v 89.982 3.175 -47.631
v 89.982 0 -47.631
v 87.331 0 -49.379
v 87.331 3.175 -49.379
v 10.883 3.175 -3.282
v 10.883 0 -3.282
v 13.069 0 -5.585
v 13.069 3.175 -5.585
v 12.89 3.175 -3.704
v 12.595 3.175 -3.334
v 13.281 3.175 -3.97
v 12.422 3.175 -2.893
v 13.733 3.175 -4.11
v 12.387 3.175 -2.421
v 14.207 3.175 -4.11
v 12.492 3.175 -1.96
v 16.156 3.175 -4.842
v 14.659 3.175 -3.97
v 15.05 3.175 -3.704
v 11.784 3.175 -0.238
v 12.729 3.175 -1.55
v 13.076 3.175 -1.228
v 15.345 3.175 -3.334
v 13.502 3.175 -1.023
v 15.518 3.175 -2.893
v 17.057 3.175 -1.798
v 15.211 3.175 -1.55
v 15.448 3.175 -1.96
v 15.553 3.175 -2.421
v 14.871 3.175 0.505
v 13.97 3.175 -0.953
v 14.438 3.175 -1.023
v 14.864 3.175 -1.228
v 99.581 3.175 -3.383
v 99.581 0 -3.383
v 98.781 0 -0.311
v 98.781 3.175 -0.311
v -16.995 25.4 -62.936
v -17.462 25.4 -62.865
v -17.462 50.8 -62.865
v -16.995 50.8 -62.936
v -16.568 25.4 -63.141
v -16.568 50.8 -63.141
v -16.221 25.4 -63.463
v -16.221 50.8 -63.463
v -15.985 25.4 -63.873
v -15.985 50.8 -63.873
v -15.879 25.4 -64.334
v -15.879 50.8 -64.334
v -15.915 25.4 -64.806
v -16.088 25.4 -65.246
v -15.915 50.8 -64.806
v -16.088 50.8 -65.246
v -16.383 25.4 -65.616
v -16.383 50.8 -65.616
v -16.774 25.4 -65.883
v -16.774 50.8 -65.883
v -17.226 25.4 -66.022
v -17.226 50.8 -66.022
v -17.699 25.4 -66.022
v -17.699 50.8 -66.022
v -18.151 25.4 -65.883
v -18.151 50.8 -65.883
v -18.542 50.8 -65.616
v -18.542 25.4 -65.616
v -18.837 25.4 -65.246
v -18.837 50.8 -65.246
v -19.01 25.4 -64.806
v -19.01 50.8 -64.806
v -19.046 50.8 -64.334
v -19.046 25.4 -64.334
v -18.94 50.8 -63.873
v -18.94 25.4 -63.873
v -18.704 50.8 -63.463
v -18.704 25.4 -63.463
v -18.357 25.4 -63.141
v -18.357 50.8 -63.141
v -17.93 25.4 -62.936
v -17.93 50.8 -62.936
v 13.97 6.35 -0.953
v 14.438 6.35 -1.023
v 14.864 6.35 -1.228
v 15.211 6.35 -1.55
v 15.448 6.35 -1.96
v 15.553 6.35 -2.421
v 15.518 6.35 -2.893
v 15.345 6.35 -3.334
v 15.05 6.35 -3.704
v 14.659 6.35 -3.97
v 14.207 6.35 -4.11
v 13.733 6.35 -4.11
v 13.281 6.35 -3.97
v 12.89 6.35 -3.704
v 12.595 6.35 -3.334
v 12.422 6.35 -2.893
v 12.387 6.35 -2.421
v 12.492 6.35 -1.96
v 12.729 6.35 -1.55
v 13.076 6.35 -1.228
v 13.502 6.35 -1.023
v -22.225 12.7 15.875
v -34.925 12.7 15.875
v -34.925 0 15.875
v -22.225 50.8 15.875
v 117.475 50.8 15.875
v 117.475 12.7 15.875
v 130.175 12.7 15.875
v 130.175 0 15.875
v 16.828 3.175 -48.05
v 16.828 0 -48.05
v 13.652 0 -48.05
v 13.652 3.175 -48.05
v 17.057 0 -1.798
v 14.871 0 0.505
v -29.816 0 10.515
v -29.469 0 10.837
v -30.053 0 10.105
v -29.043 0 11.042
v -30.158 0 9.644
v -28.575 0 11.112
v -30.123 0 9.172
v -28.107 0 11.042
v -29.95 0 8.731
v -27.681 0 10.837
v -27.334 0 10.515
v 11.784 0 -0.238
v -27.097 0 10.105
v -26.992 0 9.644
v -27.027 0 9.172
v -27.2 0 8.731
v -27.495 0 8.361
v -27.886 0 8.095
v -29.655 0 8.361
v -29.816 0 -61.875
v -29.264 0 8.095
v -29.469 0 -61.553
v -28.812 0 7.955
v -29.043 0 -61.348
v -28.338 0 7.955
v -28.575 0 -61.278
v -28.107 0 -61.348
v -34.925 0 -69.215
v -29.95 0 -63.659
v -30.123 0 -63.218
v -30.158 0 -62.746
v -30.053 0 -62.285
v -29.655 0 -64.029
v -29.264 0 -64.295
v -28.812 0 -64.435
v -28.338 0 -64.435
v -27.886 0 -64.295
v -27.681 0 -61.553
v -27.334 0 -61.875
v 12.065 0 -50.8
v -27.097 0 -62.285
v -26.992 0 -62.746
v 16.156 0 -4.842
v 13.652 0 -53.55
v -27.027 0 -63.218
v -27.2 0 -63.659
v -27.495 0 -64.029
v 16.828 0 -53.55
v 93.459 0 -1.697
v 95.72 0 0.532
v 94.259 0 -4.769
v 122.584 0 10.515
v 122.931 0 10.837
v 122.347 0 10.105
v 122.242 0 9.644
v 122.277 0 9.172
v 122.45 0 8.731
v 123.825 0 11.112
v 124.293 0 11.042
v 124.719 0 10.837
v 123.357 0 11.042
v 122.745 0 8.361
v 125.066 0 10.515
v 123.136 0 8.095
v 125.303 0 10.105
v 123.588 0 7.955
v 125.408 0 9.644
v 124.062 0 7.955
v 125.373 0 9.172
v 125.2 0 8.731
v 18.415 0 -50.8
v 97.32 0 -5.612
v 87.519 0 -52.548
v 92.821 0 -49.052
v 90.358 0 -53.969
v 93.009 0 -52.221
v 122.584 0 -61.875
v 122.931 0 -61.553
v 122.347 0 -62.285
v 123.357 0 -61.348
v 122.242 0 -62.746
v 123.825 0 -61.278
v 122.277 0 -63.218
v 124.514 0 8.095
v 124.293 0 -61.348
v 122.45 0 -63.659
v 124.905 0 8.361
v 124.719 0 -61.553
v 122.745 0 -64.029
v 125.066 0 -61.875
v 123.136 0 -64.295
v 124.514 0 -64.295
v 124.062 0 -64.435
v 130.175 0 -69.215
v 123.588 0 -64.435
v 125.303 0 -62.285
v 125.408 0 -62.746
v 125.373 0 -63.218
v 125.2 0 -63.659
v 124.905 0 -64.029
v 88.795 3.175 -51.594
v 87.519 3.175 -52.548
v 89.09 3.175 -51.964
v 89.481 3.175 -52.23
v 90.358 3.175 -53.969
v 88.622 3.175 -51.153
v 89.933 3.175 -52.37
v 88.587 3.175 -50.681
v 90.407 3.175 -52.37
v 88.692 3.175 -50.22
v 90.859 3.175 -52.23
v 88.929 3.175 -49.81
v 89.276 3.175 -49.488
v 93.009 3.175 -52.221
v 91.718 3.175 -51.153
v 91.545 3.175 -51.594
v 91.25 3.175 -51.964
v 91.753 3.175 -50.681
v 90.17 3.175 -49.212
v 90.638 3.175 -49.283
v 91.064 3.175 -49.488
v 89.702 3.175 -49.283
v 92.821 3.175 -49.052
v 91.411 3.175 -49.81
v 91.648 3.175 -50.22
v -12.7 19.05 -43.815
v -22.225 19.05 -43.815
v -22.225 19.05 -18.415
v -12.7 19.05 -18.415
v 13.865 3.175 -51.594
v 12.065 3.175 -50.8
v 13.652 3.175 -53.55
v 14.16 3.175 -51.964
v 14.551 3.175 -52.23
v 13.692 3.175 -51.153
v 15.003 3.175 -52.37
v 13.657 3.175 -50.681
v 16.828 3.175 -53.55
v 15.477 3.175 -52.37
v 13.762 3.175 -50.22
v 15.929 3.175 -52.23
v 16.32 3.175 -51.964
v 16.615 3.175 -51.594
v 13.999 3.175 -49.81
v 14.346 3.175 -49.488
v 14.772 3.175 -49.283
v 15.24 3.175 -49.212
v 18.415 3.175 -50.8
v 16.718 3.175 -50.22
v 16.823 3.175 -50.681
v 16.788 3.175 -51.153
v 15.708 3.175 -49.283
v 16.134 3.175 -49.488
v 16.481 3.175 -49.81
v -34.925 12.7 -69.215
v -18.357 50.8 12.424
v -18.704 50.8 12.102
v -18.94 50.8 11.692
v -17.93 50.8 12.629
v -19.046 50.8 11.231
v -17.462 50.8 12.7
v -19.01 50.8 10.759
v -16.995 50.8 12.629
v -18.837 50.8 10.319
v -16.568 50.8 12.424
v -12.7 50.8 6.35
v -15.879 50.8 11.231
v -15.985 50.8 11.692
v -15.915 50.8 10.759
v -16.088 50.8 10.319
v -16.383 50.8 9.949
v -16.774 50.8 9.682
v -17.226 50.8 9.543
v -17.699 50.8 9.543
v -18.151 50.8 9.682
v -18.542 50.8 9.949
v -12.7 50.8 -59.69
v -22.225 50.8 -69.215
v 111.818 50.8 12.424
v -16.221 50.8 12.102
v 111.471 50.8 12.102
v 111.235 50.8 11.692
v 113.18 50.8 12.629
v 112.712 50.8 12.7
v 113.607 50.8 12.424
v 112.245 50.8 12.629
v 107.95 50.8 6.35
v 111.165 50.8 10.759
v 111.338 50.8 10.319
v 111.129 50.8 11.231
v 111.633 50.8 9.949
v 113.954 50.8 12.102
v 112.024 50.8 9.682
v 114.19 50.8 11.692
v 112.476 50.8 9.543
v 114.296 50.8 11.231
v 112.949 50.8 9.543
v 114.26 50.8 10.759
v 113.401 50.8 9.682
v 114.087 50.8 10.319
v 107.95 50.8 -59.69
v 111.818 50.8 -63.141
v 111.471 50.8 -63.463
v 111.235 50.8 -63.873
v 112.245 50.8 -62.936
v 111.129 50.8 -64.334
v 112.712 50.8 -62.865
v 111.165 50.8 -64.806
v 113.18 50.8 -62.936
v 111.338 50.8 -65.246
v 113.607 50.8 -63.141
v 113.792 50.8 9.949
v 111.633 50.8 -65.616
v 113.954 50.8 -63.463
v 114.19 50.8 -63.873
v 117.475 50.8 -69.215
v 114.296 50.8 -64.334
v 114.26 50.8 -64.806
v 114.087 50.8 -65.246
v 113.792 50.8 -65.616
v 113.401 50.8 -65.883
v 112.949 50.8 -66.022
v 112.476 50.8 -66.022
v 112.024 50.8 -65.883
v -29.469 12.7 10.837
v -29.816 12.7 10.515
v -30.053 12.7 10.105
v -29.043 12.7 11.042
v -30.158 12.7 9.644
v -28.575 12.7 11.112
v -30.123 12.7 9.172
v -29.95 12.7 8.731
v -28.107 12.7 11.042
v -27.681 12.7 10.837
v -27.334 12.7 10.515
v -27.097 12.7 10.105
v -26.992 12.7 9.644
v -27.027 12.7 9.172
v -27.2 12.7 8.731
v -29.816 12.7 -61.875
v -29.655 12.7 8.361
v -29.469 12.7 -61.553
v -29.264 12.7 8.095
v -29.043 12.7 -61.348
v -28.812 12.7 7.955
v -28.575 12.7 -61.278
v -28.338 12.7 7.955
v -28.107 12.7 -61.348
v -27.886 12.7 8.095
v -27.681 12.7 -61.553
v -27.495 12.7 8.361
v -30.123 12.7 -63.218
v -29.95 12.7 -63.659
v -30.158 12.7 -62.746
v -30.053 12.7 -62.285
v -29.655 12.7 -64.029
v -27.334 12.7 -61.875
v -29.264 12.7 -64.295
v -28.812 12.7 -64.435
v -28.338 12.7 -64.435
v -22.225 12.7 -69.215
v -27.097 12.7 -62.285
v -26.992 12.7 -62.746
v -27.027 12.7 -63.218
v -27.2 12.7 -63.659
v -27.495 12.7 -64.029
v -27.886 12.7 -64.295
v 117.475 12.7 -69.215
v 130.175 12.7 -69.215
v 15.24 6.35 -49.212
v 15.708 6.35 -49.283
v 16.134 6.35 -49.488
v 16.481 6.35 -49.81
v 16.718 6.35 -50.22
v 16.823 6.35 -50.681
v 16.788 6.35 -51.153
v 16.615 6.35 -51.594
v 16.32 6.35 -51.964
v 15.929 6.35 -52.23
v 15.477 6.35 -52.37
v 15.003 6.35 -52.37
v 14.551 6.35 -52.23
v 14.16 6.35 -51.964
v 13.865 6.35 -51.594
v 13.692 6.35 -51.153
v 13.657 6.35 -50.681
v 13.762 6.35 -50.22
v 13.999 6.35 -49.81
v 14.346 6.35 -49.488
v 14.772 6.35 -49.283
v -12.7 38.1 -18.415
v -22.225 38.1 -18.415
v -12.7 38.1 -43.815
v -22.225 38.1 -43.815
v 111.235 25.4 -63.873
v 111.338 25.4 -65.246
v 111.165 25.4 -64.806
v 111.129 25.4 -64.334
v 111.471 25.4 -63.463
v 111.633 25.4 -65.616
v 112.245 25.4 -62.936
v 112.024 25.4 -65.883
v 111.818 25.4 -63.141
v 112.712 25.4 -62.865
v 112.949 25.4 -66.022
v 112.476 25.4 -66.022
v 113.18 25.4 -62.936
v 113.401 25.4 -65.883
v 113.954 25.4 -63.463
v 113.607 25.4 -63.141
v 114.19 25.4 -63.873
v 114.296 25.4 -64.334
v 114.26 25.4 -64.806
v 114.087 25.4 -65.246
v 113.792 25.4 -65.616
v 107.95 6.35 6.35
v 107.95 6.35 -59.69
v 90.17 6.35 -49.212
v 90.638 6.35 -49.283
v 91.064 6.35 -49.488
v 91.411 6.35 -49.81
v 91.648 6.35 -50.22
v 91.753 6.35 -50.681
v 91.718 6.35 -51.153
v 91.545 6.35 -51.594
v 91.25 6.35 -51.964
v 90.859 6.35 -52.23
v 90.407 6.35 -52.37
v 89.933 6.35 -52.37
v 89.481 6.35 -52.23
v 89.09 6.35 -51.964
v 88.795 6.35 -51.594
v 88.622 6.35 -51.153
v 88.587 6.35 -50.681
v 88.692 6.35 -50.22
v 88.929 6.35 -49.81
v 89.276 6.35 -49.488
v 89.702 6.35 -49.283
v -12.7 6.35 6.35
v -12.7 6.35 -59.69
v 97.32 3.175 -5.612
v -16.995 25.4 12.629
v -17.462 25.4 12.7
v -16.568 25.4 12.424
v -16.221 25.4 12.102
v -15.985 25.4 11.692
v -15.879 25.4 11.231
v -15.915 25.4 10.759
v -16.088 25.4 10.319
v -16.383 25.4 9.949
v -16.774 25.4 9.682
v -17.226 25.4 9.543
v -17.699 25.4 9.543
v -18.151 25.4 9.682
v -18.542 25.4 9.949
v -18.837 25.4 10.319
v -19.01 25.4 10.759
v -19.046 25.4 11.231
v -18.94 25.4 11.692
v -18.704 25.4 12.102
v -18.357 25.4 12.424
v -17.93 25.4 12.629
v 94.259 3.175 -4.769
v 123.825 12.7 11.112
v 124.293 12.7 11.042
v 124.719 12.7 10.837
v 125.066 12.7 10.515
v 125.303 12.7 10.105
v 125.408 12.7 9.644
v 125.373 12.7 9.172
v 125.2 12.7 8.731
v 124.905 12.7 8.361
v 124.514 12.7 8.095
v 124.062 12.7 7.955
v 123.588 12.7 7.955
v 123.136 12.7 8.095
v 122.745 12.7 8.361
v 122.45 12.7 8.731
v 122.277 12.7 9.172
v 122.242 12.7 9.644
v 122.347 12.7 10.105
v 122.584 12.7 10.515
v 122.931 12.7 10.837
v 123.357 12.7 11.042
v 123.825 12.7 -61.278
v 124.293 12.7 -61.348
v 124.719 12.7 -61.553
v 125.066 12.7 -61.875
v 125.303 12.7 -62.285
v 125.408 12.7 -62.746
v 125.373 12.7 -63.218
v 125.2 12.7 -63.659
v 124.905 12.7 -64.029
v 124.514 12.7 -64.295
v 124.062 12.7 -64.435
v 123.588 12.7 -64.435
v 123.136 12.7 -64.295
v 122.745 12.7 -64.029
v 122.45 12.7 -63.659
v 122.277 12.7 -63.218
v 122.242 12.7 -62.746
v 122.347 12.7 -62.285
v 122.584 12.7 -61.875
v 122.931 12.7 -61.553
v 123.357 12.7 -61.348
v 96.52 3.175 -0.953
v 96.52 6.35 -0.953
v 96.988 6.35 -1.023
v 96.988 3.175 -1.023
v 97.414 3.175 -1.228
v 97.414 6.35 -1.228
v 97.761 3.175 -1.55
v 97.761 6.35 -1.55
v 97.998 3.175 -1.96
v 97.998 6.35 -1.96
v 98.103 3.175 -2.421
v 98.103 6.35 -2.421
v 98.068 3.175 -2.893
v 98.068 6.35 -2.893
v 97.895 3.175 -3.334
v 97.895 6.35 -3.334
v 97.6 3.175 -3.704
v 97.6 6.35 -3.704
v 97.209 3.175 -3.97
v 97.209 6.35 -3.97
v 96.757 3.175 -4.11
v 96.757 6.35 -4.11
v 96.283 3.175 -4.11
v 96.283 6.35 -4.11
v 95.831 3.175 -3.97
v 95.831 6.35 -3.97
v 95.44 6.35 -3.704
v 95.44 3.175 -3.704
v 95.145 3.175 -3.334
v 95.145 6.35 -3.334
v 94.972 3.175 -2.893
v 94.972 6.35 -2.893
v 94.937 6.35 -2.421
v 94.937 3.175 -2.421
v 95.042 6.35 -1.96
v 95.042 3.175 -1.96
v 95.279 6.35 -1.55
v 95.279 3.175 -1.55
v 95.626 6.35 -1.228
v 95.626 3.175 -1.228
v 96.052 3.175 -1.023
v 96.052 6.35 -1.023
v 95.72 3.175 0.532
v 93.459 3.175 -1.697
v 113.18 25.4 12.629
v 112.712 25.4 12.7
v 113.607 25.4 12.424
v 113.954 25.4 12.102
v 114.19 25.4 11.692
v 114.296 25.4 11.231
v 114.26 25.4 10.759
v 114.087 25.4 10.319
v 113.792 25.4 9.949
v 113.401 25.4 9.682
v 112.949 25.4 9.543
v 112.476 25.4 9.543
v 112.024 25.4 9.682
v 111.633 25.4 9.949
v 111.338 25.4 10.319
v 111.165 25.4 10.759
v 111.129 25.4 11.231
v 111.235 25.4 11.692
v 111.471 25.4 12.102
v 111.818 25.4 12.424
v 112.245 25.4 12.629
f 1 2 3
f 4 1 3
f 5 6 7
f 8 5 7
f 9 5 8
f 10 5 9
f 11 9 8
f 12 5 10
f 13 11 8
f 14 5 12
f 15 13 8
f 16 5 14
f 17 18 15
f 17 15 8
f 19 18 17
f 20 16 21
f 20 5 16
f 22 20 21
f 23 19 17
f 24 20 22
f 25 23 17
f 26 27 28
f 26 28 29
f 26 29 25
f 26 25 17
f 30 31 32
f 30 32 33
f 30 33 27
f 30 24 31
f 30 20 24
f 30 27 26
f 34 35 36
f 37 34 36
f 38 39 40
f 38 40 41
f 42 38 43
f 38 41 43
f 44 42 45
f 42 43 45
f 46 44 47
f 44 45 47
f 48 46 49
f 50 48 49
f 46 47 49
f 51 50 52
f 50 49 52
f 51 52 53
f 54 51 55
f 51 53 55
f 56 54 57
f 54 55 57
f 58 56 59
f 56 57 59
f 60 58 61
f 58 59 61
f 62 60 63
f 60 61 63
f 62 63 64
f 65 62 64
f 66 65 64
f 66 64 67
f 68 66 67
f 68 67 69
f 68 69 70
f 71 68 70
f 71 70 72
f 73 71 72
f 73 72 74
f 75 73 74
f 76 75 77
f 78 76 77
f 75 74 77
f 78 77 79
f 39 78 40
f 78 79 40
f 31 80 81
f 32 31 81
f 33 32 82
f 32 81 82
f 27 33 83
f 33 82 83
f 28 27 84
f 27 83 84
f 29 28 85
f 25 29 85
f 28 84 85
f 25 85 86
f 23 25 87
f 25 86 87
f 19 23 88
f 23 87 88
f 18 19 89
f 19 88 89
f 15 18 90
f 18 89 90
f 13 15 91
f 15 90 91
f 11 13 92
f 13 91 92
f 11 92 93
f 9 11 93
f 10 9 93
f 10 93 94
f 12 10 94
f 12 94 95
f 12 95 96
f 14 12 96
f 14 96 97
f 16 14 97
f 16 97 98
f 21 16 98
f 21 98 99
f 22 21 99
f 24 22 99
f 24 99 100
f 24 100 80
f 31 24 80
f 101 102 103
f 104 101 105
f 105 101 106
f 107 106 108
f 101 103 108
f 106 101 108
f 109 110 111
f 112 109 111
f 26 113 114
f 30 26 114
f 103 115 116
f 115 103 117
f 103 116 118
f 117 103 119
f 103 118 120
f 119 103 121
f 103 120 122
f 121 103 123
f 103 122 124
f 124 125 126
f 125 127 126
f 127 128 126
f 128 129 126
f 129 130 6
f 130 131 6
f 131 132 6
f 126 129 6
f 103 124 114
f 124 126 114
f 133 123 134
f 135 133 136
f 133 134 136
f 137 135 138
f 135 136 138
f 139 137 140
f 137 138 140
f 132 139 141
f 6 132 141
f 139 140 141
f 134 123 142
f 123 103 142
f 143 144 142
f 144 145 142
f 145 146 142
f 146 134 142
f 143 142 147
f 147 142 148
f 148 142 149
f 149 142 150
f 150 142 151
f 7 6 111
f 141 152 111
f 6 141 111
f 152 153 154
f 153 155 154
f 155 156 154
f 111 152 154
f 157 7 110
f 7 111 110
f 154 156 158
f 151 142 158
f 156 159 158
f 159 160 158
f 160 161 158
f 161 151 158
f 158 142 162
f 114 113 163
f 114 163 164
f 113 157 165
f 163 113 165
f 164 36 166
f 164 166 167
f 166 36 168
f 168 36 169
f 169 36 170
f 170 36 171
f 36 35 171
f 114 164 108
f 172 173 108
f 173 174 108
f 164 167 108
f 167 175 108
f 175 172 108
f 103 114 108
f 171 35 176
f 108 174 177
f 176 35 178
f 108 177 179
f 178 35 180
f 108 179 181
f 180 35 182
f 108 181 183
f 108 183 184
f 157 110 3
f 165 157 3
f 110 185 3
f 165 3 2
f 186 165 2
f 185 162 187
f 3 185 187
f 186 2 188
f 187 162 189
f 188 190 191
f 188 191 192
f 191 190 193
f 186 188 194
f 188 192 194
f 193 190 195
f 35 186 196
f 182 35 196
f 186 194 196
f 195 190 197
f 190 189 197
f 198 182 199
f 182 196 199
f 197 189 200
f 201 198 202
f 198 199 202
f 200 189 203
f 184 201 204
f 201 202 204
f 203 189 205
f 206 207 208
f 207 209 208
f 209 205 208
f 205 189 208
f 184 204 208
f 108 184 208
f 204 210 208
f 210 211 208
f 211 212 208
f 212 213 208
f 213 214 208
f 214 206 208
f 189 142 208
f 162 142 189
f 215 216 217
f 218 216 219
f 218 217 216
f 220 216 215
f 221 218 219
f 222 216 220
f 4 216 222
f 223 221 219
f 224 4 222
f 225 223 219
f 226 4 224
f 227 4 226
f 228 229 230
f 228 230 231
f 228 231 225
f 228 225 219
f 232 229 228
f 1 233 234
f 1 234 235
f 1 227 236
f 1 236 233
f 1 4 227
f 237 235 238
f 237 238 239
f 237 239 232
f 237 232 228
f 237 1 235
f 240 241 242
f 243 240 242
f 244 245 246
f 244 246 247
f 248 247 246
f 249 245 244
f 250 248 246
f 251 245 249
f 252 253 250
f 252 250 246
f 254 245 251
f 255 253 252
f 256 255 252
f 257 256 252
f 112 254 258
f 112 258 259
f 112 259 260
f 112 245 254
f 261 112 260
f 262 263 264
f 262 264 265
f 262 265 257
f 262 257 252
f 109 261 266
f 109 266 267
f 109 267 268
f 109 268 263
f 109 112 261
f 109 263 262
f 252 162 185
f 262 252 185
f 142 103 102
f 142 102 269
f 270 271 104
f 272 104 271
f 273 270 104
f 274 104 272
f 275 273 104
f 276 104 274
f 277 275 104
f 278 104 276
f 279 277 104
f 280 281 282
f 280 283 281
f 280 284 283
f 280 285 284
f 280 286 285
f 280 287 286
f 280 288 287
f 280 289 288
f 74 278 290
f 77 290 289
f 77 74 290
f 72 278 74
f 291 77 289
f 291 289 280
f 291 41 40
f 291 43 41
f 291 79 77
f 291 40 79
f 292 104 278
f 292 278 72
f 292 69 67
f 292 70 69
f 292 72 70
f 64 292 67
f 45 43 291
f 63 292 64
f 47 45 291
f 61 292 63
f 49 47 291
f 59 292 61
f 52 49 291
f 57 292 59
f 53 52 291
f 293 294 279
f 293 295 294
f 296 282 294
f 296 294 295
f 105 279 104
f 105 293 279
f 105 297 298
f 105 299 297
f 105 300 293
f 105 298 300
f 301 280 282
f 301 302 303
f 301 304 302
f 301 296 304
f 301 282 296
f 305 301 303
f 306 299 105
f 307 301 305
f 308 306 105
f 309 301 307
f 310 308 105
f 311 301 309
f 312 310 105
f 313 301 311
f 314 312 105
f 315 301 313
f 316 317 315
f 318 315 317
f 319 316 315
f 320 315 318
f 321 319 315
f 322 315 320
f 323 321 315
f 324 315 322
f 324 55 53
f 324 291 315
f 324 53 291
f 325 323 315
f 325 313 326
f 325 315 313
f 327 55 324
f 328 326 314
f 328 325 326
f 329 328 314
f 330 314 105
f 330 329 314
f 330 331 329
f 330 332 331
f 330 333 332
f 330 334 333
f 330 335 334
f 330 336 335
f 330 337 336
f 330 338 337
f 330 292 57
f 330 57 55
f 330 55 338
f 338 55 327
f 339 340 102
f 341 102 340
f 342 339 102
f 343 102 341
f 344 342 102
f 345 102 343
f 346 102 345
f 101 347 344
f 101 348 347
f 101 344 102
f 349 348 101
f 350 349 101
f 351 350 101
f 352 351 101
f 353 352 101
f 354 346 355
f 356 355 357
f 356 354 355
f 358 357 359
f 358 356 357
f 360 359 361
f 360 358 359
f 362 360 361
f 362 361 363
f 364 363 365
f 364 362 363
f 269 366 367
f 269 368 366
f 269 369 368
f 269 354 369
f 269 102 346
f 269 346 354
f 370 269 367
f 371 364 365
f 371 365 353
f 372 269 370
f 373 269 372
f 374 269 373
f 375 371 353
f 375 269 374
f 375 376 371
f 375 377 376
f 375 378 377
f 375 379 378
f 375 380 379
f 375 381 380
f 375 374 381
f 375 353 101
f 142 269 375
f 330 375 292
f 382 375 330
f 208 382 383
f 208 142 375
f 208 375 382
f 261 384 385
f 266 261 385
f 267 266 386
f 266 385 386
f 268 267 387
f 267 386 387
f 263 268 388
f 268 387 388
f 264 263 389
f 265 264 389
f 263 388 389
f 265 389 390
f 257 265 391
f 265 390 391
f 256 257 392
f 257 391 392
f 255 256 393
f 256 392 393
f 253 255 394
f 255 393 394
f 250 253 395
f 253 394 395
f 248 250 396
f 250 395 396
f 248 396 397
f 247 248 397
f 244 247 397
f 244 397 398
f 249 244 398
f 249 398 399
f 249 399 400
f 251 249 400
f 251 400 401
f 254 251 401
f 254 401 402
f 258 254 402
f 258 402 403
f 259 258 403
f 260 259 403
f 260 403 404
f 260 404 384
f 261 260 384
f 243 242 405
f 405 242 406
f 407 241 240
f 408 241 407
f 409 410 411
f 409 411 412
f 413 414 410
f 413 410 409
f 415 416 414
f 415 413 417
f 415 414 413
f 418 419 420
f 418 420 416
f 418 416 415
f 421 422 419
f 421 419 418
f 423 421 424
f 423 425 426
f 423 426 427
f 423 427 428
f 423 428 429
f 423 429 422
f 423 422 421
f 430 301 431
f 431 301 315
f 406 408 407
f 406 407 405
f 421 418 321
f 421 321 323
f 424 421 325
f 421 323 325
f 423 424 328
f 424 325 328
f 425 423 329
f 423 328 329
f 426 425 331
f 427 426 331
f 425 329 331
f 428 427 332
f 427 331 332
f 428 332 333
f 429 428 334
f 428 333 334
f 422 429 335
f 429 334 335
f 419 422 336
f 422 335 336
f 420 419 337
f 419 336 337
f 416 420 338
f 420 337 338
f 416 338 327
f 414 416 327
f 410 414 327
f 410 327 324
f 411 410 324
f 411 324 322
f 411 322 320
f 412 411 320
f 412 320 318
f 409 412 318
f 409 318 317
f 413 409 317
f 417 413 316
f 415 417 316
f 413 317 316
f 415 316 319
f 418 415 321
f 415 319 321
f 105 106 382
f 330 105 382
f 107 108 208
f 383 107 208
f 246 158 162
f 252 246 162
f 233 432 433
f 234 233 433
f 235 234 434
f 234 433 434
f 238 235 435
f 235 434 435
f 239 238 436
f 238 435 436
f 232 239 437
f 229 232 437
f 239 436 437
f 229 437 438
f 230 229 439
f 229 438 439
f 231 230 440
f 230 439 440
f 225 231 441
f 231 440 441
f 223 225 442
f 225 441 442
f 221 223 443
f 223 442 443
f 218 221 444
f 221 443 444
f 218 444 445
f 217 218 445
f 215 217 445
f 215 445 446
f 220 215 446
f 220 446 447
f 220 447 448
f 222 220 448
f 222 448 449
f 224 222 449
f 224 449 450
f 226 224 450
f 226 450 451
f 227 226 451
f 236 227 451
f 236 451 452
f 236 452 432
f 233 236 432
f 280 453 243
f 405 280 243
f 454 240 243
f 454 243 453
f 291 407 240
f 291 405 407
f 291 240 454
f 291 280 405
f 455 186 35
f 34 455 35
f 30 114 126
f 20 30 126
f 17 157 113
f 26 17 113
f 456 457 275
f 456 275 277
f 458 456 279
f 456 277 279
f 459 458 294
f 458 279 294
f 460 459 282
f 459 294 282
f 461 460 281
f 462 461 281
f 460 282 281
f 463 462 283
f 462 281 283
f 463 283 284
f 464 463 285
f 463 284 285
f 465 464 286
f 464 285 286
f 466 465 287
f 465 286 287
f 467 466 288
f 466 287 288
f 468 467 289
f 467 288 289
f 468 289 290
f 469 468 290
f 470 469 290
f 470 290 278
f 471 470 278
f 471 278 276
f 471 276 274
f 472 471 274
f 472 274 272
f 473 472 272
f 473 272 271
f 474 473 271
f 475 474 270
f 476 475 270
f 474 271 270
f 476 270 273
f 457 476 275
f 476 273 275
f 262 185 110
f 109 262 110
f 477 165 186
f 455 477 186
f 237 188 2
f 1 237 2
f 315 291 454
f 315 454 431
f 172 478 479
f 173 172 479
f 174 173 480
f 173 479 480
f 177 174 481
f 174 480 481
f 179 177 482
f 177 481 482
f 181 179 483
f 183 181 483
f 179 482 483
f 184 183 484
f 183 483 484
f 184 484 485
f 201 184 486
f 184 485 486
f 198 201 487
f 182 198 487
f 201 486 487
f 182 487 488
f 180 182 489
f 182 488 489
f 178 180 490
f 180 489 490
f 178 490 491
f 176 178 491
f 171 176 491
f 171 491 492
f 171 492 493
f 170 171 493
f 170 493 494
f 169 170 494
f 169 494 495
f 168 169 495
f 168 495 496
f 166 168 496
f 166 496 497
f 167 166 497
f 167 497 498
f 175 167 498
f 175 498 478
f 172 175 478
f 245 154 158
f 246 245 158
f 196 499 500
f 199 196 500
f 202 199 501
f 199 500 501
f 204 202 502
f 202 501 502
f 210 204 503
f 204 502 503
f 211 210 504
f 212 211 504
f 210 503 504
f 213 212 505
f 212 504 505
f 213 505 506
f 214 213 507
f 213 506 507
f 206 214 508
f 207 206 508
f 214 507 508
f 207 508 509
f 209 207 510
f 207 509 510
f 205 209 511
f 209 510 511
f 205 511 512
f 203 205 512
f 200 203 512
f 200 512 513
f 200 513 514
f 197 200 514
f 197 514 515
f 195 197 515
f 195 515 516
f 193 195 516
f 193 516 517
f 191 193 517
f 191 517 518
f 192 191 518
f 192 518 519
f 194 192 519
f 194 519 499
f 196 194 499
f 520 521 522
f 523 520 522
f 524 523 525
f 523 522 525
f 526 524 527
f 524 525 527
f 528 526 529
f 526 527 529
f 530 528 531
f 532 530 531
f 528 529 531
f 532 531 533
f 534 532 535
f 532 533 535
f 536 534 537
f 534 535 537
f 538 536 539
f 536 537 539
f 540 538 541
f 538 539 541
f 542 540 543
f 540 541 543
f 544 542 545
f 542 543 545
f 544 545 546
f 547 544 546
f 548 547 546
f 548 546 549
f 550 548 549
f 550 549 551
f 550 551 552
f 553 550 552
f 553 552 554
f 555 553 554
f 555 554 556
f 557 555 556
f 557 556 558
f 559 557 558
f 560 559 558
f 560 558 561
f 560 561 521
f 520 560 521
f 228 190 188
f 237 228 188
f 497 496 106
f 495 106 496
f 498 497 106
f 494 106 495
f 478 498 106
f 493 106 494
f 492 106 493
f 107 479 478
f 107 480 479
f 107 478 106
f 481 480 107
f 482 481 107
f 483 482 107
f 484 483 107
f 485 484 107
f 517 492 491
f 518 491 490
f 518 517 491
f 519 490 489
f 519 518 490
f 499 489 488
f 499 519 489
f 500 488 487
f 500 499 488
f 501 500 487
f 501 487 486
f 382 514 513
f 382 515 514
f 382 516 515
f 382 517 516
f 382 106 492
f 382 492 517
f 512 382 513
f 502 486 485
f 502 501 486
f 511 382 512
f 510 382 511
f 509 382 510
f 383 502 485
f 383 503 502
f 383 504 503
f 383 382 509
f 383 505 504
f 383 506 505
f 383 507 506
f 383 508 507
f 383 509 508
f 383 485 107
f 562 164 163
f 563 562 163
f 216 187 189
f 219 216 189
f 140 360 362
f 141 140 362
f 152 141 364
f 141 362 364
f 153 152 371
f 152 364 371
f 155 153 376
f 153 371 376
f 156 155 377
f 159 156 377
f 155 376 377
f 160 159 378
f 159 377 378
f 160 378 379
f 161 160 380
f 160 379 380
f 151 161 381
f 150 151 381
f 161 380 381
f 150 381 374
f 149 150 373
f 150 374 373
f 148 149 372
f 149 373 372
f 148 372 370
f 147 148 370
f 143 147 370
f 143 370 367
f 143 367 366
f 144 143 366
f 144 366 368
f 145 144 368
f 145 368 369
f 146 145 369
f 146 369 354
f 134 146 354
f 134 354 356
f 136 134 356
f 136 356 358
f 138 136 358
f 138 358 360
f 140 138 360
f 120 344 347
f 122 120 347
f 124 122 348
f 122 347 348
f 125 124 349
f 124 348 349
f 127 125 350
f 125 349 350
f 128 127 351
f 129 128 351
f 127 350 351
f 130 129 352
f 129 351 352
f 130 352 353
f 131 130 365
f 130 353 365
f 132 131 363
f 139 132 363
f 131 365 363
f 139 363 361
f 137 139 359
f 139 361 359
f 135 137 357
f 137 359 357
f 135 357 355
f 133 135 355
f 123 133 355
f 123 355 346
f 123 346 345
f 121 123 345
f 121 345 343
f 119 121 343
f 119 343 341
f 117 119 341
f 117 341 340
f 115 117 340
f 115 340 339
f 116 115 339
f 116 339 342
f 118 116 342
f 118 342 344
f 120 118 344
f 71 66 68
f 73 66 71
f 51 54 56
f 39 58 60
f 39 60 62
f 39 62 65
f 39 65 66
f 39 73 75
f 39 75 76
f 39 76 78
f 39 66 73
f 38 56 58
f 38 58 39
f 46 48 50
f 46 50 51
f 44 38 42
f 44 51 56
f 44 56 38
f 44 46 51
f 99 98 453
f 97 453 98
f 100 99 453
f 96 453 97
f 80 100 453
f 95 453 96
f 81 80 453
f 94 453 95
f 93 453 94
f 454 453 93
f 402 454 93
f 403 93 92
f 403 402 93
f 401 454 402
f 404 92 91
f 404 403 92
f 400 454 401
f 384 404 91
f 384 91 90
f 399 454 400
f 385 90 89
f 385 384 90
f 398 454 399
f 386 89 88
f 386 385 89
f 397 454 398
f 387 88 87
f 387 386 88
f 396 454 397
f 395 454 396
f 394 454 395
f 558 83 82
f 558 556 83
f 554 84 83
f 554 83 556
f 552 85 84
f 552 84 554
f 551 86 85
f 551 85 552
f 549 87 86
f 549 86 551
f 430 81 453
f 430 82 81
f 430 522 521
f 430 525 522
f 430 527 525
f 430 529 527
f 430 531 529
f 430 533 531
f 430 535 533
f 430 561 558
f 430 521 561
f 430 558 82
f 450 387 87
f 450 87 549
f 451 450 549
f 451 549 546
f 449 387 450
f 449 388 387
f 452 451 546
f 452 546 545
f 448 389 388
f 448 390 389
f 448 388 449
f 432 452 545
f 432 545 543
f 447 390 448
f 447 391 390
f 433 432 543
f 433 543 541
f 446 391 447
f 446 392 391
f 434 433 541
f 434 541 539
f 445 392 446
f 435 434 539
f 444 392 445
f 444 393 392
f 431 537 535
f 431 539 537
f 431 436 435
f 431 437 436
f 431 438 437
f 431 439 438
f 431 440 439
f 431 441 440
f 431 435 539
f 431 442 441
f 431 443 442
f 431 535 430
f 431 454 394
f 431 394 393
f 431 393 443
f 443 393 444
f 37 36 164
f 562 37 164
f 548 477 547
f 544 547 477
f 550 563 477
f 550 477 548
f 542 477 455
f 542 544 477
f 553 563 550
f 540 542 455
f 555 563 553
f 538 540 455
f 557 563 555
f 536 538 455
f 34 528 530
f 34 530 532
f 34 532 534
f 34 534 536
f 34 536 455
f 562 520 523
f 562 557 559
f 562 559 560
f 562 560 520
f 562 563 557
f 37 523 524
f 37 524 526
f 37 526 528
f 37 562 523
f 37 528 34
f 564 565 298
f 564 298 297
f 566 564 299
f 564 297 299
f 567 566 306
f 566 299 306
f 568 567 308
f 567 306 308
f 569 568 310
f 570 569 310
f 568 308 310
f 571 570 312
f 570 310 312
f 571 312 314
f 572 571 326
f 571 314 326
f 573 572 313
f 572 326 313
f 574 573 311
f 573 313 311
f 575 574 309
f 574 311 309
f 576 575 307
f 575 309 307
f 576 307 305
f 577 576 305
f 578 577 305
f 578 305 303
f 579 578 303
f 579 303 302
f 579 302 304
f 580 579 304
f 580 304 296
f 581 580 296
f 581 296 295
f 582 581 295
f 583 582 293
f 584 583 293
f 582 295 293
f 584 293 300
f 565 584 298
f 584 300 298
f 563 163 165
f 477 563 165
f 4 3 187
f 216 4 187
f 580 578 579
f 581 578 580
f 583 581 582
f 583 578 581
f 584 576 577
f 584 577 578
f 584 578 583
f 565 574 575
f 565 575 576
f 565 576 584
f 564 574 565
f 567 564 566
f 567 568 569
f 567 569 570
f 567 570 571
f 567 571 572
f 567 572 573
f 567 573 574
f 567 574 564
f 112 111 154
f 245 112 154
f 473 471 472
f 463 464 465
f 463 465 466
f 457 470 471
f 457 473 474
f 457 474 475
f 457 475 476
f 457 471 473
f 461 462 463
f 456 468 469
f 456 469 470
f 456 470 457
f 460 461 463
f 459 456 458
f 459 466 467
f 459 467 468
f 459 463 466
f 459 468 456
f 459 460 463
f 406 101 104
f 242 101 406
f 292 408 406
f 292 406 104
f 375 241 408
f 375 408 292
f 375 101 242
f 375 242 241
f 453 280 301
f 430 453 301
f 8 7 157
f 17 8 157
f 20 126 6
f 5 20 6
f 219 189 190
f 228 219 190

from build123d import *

# Parameters (mm, degrees)
SKETCH1_W           = 165.1
SKETCH1_H           = 85.09
BOSS_EXTRUDE2_DEPTH = 12.7
SKETCH3_W           = 139.7
SKETCH3_H           = 85.09
BOSS_EXTRUDE3_DEPTH = 38.1
SKETCH4_W           = 120.65
SKETCH4_H           = 66.04
CUT_EXTRUDE1_DEPTH  = 44.45
SKETCH5_R           = 1.5875
CUT_EXTRUDE3_DEPTH  = 154.98717268
SKETCH8_R           = 1.5875
CUT_EXTRUDE4_DEPTH  = 25.4
SKETCH11_R          = 1.5875
CUT_EXTRUDE6_DEPTH  = 153.275595057
CUT_EXTRUDE7_DEPTH  = 3.175
CUT_EXTRUDE8_REACH  = 176.92
SKETCH15_W          = 25.4
SKETCH15_H          = 19.05


with BuildPart() as part:
    # Sketch1 → Boss-Extrude2 (new body)
    with BuildSketch(Plane(origin=(0, 0, 0), x_dir=(1, 0, 0), z_dir=(0, 1, 0))):
        with Locations((47.625, 26.67)):
            Rectangle(SKETCH1_W, SKETCH1_H)
    extrude(amount=BOSS_EXTRUDE2_DEPTH)

    # Sketch3 → Boss-Extrude3 (add)
    with BuildSketch(Plane(origin=(0, 12.7, 0), x_dir=(1, 0, 0), z_dir=(0, 1, 0))):
        with Locations((47.625, 26.67)):
            Rectangle(SKETCH3_W, SKETCH3_H)
    extrude(amount=BOSS_EXTRUDE3_DEPTH)

    # Sketch4 → Cut-Extrude1 (cut)
    with BuildSketch(Plane(origin=(0, 50.8, 0), x_dir=(1, 0, 0), z_dir=(0, 1, 0))):
        with Locations((47.625, 26.67)):
            Rectangle(SKETCH4_W, SKETCH4_H)
    extrude(amount=-CUT_EXTRUDE1_DEPTH, mode=Mode.SUBTRACT)

    # Sketch5 → Cut-Extrude3 (cut, through all)
    with BuildSketch(Plane(origin=(0, 6.35, 0), x_dir=(1, 0, 0), z_dir=(0, 1, 0))):
        with Locations(Location((15.24, 50.8, 0), (0, 0, 270))):
            Circle(SKETCH5_R)
        with Locations(Location((13.97, 2.54, 0), (0, 0, 270))):
            Circle(SKETCH5_R)
        with Locations(Location((90.17, 50.8, 0), (0, 0, 270))):
            Circle(SKETCH5_R)
        with Locations(Location((96.52, 2.54, 0), (0, 0, 270))):
            Circle(SKETCH5_R)
    extrude(amount=-CUT_EXTRUDE3_DEPTH, mode=Mode.SUBTRACT)

    # Sketch8 → Cut-Extrude4 (cut)
    with BuildSketch(Plane(origin=(0, 50.8, 0), x_dir=(1, 0, 0), z_dir=(0, 1, 0))):
        with Locations(Location((-17.4625, 64.4525, 0), (0, 0, 270))):
            Circle(SKETCH8_R)
        with Locations(Location((-17.4625, -11.1125, 0), (0, 0, 270))):
            Circle(SKETCH8_R)
        with Locations(Location((112.7125, -11.1125, 0), (0, 0, 270))):
            Circle(SKETCH8_R)
        with Locations(Location((112.7125, 64.4525, 0), (0, 0, 270))):
            Circle(SKETCH8_R)
    extrude(amount=-CUT_EXTRUDE4_DEPTH, mode=Mode.SUBTRACT)

    # Sketch11 → Cut-Extrude6 (cut, through all)
    with BuildSketch(Plane(origin=(0, 12.7, 0), x_dir=(1, 0, 0), z_dir=(0, 1, 0))):
        with Locations(Location((-28.575, 62.865, 0), (0, 0, 270))):
            Circle(SKETCH11_R)
        with Locations(Location((-28.575, -9.525, 0), (0, 0, 270))):
            Circle(SKETCH11_R)
        with Locations(Location((123.825, -9.525, 0), (0, 0, 270))):
            Circle(SKETCH11_R)
        with Locations(Location((123.825, 62.865, 0), (0, 0, 270))):
            Circle(SKETCH11_R)
    extrude(amount=-CUT_EXTRUDE6_DEPTH, mode=Mode.SUBTRACT)

    # Sketch14 → Cut-Extrude7 (cut)
    with BuildSketch(Plane.XZ):
        Polygon((17.057033947, -1.79780972), (14.870761336, 0.50454496), (11.783727389, -0.23764532), (10.882966053, -3.28219028), (13.069238664, -5.58454496), (16.156272611, -4.84235468), align=None)
        Polygon((18.415, -50.8), (16.8275, -48.050369343), (13.6525, -48.050369343), (12.065, -50.8), (13.6525, -53.549630657), (16.8275, -53.549630657), align=None)
        Polygon((93.009008497, -52.221497715), (92.820557381, -49.052095378), (89.981548884, -47.630597662), (87.330991503, -49.378502285), (87.519442619, -52.547904622), (90.358451116, -53.969402338), align=None)
        Polygon((99.581036114, -3.383020112), (98.78059489, -0.310575019), (95.719558776, 0.532445092), (93.458963886, -1.696979888), (94.25940511, -4.769424981), (97.320441224, -5.612445092), align=None)
    extrude(amount=-CUT_EXTRUDE7_DEPTH, mode=Mode.SUBTRACT)

    # Sketch15 → Cut-Extrude8 (cut, up to next)
    with BuildSketch(Plane.ZY.offset(22.225), mode=Mode.PRIVATE) as cut_extrude8_sk1:
        with Locations((-31.115, 28.575)):
            Rectangle(SKETCH15_W, SKETCH15_H)
    cut_extrude8_tool1 = extrude(cut_extrude8_sk1.sketch, amount=-CUT_EXTRUDE8_REACH, mode=Mode.PRIVATE) & part.part
    add(cut_extrude8_tool1.solids().sort_by_distance((-22.225, 28.575, -31.115))[0], mode=Mode.SUBTRACT)


solid = part.part
